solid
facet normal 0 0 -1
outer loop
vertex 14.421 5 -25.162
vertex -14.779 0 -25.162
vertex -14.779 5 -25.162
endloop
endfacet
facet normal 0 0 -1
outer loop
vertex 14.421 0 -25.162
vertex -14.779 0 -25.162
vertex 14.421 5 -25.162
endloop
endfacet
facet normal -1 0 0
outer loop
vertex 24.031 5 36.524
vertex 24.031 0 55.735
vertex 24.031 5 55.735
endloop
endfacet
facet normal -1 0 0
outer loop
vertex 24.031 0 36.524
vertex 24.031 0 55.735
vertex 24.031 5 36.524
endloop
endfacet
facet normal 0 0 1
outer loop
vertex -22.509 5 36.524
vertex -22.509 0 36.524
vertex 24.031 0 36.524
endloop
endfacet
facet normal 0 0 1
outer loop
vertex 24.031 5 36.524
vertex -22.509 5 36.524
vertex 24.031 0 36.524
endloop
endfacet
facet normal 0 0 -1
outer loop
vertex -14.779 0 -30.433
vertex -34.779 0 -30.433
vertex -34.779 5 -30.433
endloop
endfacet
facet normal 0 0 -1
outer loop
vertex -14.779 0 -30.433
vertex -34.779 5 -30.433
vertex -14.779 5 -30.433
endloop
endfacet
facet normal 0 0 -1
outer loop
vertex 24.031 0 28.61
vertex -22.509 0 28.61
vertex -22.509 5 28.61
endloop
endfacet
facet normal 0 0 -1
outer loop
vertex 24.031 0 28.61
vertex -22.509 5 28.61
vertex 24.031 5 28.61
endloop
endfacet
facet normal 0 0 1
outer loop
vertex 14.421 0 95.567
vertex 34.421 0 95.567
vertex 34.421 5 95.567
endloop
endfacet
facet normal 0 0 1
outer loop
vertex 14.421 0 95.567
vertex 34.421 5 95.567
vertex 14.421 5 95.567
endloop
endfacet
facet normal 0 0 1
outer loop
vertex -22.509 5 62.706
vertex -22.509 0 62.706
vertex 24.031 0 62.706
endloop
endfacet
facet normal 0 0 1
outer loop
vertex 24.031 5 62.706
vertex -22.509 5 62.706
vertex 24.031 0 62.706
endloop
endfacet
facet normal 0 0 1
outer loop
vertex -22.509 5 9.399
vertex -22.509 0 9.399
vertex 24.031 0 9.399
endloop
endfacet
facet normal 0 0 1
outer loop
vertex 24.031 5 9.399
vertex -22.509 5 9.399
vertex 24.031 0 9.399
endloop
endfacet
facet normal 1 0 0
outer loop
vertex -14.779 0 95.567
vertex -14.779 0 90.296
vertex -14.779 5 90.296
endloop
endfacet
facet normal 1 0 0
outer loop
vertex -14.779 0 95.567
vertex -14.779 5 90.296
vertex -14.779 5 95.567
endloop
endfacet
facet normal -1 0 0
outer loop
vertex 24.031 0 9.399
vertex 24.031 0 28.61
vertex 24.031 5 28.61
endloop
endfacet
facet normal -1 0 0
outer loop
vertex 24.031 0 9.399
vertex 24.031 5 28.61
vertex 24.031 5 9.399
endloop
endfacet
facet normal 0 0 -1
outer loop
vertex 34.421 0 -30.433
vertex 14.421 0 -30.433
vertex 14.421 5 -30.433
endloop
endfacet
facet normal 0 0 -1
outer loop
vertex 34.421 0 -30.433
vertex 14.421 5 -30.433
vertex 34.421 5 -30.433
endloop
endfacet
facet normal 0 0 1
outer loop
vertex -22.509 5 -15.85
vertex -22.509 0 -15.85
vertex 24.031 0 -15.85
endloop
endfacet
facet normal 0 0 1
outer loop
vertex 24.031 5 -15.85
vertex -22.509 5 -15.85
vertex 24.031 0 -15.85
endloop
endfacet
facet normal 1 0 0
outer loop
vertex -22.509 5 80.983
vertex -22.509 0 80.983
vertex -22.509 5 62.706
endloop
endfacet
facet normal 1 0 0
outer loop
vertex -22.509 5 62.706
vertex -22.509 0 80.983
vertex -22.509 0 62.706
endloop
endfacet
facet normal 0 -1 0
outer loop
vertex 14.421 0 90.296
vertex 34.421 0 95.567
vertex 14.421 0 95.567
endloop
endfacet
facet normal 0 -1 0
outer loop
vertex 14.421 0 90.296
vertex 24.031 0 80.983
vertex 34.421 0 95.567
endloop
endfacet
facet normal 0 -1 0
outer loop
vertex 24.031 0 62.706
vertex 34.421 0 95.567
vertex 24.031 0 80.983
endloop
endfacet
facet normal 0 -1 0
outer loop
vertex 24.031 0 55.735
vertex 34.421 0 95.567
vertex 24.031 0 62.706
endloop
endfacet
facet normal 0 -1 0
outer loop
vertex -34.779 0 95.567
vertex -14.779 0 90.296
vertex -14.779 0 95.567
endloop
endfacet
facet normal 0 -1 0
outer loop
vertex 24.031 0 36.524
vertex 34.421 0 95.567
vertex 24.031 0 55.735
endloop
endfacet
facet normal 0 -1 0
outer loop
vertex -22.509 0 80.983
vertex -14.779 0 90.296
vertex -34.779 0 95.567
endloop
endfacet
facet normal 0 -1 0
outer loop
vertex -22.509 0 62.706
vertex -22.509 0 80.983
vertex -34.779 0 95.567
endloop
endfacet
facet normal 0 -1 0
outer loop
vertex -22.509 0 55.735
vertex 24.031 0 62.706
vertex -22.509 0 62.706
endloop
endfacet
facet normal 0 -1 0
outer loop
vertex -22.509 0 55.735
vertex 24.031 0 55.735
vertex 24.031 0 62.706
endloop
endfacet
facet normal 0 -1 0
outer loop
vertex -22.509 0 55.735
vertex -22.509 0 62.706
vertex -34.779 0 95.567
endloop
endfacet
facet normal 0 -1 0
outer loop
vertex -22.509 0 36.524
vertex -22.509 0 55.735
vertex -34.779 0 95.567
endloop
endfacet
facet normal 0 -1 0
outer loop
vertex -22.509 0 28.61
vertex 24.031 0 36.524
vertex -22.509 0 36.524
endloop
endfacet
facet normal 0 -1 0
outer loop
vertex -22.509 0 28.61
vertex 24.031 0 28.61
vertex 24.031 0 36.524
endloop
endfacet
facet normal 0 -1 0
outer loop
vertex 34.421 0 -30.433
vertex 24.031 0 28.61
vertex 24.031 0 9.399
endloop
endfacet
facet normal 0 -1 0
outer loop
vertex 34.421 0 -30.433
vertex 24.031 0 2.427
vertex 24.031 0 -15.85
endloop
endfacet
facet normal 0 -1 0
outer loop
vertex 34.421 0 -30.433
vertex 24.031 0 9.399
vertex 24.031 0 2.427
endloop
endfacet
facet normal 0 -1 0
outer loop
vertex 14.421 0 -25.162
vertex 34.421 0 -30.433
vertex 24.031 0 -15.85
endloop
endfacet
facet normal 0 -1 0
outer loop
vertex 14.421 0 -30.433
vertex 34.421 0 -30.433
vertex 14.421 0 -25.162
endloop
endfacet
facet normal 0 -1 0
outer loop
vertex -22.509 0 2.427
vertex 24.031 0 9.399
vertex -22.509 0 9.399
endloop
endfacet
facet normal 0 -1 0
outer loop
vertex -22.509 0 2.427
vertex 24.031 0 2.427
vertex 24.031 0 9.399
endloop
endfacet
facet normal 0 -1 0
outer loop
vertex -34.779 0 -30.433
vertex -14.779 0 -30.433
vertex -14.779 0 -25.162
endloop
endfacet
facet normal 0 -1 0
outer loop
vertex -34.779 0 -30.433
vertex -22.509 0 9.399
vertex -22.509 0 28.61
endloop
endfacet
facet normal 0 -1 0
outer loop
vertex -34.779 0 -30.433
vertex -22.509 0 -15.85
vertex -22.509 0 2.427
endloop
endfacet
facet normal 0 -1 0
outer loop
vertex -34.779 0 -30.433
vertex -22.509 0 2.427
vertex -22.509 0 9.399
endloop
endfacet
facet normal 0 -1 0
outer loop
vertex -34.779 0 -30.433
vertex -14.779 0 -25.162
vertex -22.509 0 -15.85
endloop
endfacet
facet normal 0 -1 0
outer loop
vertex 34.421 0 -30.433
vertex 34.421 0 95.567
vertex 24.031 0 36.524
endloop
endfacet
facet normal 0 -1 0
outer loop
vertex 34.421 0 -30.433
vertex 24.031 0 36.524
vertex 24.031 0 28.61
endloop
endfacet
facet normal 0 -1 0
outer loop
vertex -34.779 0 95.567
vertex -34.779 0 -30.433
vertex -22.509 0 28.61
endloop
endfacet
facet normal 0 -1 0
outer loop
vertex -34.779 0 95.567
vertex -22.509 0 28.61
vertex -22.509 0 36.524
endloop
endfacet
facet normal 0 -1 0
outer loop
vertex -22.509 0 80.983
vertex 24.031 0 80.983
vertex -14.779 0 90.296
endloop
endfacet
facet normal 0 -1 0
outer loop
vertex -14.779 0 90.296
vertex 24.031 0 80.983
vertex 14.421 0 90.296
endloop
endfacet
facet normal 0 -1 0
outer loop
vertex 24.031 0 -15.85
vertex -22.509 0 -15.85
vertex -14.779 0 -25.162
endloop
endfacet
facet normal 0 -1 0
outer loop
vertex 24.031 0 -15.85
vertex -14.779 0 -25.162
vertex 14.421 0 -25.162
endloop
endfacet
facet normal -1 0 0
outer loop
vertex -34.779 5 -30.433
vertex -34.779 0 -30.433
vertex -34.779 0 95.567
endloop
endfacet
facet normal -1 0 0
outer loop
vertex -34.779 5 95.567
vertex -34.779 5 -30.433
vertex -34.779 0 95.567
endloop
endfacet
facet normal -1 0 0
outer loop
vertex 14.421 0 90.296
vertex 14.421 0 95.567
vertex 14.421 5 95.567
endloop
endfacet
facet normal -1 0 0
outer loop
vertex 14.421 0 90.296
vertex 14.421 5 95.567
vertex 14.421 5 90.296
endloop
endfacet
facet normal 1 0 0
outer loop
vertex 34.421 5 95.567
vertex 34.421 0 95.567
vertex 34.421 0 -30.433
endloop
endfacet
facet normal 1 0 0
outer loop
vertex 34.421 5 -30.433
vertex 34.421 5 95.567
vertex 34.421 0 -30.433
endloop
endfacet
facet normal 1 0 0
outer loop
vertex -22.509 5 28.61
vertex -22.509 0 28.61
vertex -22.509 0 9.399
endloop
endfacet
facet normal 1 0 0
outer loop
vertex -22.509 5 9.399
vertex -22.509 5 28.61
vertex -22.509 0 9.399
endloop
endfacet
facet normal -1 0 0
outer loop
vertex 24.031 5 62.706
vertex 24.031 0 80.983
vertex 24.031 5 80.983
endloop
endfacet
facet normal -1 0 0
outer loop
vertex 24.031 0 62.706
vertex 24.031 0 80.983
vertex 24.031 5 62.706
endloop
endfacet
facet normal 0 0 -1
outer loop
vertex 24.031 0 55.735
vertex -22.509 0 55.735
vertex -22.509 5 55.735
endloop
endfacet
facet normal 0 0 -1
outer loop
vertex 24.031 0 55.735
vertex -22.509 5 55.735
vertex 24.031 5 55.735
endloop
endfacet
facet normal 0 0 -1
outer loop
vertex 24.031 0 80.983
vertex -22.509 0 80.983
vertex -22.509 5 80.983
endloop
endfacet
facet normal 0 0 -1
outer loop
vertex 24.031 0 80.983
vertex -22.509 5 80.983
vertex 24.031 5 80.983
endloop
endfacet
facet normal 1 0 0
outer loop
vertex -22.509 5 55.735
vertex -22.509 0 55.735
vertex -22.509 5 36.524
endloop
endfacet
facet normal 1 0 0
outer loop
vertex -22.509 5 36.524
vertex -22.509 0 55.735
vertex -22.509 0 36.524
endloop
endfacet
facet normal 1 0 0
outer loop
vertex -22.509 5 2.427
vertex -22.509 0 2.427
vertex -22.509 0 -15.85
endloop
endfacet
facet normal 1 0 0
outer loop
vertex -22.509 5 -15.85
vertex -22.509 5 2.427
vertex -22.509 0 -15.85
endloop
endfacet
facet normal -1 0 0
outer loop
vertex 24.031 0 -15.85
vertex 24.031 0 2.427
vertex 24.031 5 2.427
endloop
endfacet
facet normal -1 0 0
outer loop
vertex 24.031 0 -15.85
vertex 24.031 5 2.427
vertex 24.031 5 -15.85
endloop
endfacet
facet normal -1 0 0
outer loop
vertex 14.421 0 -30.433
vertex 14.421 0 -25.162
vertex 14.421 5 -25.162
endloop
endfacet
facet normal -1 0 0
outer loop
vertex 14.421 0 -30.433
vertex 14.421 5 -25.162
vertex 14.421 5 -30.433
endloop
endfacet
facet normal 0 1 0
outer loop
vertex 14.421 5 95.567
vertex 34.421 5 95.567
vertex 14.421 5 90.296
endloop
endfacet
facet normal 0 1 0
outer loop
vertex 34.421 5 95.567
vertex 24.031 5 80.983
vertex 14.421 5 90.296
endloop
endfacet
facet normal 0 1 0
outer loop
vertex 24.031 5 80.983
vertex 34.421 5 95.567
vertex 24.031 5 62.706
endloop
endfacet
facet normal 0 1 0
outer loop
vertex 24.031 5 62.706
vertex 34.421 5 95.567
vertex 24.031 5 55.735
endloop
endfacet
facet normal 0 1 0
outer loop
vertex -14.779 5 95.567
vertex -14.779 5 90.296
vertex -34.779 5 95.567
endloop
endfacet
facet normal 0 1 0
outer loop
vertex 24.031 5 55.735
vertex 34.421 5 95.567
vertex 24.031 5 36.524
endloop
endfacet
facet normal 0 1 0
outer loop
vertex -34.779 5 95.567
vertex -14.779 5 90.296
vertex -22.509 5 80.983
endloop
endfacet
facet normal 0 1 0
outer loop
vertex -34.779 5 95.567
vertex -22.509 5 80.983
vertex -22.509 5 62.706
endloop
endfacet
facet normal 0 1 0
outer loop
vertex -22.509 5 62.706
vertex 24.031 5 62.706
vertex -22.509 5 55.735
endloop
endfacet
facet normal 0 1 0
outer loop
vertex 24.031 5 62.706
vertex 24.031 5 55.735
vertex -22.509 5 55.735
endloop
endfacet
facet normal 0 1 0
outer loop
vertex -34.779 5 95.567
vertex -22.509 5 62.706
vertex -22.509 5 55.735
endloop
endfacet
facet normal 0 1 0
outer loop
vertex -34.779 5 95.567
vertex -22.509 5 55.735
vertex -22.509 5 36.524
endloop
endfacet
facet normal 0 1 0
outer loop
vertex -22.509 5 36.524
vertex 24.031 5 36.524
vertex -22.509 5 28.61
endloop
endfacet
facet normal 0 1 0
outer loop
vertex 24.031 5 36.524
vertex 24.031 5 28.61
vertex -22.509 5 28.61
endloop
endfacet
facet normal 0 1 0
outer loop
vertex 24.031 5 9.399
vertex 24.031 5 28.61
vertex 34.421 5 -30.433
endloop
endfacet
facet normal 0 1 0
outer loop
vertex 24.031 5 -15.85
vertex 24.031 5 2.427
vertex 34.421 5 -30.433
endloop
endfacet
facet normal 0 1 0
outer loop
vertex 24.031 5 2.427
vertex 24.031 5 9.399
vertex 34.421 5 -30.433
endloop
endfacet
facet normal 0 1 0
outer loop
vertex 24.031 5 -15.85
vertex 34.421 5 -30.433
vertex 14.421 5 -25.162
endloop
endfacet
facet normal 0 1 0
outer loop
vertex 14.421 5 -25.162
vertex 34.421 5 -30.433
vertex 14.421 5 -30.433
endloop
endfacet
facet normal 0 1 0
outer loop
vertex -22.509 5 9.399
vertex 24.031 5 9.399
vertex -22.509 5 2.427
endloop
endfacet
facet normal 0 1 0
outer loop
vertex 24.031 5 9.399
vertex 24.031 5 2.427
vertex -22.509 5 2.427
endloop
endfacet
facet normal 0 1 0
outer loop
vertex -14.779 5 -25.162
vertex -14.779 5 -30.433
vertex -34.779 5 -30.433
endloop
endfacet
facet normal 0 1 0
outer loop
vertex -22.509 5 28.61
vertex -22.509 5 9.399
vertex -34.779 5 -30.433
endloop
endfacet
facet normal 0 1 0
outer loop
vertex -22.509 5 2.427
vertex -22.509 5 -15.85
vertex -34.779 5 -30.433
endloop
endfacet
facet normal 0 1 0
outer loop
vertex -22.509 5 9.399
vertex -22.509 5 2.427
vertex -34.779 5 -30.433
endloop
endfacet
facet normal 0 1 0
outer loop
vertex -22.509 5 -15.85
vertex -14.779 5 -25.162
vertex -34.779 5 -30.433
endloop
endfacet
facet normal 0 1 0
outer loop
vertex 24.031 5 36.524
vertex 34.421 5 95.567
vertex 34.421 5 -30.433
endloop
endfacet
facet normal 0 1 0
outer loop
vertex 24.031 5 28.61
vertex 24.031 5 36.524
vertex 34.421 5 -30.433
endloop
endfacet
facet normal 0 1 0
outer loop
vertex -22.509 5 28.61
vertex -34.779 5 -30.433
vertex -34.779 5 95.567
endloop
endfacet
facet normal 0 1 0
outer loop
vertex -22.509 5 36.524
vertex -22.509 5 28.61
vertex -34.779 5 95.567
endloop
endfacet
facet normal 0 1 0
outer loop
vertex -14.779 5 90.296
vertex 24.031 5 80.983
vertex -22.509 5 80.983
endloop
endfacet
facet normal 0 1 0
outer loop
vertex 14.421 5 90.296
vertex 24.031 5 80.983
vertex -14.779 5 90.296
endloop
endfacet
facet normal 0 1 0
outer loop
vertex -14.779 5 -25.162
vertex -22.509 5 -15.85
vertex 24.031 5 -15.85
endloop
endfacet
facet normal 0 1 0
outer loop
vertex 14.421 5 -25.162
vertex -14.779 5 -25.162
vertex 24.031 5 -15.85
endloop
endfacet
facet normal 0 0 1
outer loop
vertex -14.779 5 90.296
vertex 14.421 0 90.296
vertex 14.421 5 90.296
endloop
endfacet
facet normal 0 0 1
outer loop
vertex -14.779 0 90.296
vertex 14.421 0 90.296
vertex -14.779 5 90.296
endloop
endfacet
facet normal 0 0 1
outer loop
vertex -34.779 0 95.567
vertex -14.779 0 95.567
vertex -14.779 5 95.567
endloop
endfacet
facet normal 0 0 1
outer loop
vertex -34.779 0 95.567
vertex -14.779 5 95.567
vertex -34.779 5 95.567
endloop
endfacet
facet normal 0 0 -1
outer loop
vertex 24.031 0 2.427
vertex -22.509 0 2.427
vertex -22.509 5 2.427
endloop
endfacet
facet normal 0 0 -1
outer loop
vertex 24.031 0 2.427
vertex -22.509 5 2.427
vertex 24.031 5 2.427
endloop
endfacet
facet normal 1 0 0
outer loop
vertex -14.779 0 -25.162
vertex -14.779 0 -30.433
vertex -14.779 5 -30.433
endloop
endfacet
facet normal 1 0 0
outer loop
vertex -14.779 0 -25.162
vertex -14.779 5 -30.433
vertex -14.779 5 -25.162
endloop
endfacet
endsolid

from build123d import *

# Parameters (mm, degrees)
SKETCH1_W           = 46.539672572
SKETCH1_H           = 19.211338676
SKETCH1_H_2         = 18.276713521
SKETCH1_H_3         = 18.27671352
BOSS_EXTRUDE1_DEPTH = 5


with BuildPart() as part:
    # Sketch1 → Boss-Extrude1 (new body)
    with BuildSketch(Plane(origin=(0, 0, 0), x_dir=(1, 0, 0), z_dir=(0, 1, 0))):
        Polygon((-14.77881137, 25.162411855), (14.42118863, 25.162411855), (14.42118863, 30.433230433), (34.42118863, 30.433230433), (34.42118863, 25.433230433), (34.42118863, -90.566769567), (34.42118863, -95.566769567), (14.42118863, -95.566769567), (14.42118863, -90.29595099), (-14.77881137, -90.29595099), (-14.77881137, -95.566769567), (-34.77881137, -95.566769567), (-34.77881137, -90.566769567), (-34.77881137, 25.433230433), (-34.77881137, 30.433230433), (-14.77881137, 30.433230433), align=None)
        with Locations((0.760939105, -46.129253173)):
            Rectangle(SKETCH1_W, SKETCH1_H, mode=Mode.SUBTRACT)
        with Locations((0.760939105, 6.711270036)):
            Rectangle(SKETCH1_W, SKETCH1_H_2, mode=Mode.SUBTRACT)
        with Locations((0.760939105, -19.004285962)):
            Rectangle(SKETCH1_W, SKETCH1_H, mode=Mode.SUBTRACT)
        with Locations((0.760939105, -71.84480917)):
            Rectangle(SKETCH1_W, SKETCH1_H_3, mode=Mode.SUBTRACT)
    extrude(amount=BOSS_EXTRUDE1_DEPTH)


solid = part.part
